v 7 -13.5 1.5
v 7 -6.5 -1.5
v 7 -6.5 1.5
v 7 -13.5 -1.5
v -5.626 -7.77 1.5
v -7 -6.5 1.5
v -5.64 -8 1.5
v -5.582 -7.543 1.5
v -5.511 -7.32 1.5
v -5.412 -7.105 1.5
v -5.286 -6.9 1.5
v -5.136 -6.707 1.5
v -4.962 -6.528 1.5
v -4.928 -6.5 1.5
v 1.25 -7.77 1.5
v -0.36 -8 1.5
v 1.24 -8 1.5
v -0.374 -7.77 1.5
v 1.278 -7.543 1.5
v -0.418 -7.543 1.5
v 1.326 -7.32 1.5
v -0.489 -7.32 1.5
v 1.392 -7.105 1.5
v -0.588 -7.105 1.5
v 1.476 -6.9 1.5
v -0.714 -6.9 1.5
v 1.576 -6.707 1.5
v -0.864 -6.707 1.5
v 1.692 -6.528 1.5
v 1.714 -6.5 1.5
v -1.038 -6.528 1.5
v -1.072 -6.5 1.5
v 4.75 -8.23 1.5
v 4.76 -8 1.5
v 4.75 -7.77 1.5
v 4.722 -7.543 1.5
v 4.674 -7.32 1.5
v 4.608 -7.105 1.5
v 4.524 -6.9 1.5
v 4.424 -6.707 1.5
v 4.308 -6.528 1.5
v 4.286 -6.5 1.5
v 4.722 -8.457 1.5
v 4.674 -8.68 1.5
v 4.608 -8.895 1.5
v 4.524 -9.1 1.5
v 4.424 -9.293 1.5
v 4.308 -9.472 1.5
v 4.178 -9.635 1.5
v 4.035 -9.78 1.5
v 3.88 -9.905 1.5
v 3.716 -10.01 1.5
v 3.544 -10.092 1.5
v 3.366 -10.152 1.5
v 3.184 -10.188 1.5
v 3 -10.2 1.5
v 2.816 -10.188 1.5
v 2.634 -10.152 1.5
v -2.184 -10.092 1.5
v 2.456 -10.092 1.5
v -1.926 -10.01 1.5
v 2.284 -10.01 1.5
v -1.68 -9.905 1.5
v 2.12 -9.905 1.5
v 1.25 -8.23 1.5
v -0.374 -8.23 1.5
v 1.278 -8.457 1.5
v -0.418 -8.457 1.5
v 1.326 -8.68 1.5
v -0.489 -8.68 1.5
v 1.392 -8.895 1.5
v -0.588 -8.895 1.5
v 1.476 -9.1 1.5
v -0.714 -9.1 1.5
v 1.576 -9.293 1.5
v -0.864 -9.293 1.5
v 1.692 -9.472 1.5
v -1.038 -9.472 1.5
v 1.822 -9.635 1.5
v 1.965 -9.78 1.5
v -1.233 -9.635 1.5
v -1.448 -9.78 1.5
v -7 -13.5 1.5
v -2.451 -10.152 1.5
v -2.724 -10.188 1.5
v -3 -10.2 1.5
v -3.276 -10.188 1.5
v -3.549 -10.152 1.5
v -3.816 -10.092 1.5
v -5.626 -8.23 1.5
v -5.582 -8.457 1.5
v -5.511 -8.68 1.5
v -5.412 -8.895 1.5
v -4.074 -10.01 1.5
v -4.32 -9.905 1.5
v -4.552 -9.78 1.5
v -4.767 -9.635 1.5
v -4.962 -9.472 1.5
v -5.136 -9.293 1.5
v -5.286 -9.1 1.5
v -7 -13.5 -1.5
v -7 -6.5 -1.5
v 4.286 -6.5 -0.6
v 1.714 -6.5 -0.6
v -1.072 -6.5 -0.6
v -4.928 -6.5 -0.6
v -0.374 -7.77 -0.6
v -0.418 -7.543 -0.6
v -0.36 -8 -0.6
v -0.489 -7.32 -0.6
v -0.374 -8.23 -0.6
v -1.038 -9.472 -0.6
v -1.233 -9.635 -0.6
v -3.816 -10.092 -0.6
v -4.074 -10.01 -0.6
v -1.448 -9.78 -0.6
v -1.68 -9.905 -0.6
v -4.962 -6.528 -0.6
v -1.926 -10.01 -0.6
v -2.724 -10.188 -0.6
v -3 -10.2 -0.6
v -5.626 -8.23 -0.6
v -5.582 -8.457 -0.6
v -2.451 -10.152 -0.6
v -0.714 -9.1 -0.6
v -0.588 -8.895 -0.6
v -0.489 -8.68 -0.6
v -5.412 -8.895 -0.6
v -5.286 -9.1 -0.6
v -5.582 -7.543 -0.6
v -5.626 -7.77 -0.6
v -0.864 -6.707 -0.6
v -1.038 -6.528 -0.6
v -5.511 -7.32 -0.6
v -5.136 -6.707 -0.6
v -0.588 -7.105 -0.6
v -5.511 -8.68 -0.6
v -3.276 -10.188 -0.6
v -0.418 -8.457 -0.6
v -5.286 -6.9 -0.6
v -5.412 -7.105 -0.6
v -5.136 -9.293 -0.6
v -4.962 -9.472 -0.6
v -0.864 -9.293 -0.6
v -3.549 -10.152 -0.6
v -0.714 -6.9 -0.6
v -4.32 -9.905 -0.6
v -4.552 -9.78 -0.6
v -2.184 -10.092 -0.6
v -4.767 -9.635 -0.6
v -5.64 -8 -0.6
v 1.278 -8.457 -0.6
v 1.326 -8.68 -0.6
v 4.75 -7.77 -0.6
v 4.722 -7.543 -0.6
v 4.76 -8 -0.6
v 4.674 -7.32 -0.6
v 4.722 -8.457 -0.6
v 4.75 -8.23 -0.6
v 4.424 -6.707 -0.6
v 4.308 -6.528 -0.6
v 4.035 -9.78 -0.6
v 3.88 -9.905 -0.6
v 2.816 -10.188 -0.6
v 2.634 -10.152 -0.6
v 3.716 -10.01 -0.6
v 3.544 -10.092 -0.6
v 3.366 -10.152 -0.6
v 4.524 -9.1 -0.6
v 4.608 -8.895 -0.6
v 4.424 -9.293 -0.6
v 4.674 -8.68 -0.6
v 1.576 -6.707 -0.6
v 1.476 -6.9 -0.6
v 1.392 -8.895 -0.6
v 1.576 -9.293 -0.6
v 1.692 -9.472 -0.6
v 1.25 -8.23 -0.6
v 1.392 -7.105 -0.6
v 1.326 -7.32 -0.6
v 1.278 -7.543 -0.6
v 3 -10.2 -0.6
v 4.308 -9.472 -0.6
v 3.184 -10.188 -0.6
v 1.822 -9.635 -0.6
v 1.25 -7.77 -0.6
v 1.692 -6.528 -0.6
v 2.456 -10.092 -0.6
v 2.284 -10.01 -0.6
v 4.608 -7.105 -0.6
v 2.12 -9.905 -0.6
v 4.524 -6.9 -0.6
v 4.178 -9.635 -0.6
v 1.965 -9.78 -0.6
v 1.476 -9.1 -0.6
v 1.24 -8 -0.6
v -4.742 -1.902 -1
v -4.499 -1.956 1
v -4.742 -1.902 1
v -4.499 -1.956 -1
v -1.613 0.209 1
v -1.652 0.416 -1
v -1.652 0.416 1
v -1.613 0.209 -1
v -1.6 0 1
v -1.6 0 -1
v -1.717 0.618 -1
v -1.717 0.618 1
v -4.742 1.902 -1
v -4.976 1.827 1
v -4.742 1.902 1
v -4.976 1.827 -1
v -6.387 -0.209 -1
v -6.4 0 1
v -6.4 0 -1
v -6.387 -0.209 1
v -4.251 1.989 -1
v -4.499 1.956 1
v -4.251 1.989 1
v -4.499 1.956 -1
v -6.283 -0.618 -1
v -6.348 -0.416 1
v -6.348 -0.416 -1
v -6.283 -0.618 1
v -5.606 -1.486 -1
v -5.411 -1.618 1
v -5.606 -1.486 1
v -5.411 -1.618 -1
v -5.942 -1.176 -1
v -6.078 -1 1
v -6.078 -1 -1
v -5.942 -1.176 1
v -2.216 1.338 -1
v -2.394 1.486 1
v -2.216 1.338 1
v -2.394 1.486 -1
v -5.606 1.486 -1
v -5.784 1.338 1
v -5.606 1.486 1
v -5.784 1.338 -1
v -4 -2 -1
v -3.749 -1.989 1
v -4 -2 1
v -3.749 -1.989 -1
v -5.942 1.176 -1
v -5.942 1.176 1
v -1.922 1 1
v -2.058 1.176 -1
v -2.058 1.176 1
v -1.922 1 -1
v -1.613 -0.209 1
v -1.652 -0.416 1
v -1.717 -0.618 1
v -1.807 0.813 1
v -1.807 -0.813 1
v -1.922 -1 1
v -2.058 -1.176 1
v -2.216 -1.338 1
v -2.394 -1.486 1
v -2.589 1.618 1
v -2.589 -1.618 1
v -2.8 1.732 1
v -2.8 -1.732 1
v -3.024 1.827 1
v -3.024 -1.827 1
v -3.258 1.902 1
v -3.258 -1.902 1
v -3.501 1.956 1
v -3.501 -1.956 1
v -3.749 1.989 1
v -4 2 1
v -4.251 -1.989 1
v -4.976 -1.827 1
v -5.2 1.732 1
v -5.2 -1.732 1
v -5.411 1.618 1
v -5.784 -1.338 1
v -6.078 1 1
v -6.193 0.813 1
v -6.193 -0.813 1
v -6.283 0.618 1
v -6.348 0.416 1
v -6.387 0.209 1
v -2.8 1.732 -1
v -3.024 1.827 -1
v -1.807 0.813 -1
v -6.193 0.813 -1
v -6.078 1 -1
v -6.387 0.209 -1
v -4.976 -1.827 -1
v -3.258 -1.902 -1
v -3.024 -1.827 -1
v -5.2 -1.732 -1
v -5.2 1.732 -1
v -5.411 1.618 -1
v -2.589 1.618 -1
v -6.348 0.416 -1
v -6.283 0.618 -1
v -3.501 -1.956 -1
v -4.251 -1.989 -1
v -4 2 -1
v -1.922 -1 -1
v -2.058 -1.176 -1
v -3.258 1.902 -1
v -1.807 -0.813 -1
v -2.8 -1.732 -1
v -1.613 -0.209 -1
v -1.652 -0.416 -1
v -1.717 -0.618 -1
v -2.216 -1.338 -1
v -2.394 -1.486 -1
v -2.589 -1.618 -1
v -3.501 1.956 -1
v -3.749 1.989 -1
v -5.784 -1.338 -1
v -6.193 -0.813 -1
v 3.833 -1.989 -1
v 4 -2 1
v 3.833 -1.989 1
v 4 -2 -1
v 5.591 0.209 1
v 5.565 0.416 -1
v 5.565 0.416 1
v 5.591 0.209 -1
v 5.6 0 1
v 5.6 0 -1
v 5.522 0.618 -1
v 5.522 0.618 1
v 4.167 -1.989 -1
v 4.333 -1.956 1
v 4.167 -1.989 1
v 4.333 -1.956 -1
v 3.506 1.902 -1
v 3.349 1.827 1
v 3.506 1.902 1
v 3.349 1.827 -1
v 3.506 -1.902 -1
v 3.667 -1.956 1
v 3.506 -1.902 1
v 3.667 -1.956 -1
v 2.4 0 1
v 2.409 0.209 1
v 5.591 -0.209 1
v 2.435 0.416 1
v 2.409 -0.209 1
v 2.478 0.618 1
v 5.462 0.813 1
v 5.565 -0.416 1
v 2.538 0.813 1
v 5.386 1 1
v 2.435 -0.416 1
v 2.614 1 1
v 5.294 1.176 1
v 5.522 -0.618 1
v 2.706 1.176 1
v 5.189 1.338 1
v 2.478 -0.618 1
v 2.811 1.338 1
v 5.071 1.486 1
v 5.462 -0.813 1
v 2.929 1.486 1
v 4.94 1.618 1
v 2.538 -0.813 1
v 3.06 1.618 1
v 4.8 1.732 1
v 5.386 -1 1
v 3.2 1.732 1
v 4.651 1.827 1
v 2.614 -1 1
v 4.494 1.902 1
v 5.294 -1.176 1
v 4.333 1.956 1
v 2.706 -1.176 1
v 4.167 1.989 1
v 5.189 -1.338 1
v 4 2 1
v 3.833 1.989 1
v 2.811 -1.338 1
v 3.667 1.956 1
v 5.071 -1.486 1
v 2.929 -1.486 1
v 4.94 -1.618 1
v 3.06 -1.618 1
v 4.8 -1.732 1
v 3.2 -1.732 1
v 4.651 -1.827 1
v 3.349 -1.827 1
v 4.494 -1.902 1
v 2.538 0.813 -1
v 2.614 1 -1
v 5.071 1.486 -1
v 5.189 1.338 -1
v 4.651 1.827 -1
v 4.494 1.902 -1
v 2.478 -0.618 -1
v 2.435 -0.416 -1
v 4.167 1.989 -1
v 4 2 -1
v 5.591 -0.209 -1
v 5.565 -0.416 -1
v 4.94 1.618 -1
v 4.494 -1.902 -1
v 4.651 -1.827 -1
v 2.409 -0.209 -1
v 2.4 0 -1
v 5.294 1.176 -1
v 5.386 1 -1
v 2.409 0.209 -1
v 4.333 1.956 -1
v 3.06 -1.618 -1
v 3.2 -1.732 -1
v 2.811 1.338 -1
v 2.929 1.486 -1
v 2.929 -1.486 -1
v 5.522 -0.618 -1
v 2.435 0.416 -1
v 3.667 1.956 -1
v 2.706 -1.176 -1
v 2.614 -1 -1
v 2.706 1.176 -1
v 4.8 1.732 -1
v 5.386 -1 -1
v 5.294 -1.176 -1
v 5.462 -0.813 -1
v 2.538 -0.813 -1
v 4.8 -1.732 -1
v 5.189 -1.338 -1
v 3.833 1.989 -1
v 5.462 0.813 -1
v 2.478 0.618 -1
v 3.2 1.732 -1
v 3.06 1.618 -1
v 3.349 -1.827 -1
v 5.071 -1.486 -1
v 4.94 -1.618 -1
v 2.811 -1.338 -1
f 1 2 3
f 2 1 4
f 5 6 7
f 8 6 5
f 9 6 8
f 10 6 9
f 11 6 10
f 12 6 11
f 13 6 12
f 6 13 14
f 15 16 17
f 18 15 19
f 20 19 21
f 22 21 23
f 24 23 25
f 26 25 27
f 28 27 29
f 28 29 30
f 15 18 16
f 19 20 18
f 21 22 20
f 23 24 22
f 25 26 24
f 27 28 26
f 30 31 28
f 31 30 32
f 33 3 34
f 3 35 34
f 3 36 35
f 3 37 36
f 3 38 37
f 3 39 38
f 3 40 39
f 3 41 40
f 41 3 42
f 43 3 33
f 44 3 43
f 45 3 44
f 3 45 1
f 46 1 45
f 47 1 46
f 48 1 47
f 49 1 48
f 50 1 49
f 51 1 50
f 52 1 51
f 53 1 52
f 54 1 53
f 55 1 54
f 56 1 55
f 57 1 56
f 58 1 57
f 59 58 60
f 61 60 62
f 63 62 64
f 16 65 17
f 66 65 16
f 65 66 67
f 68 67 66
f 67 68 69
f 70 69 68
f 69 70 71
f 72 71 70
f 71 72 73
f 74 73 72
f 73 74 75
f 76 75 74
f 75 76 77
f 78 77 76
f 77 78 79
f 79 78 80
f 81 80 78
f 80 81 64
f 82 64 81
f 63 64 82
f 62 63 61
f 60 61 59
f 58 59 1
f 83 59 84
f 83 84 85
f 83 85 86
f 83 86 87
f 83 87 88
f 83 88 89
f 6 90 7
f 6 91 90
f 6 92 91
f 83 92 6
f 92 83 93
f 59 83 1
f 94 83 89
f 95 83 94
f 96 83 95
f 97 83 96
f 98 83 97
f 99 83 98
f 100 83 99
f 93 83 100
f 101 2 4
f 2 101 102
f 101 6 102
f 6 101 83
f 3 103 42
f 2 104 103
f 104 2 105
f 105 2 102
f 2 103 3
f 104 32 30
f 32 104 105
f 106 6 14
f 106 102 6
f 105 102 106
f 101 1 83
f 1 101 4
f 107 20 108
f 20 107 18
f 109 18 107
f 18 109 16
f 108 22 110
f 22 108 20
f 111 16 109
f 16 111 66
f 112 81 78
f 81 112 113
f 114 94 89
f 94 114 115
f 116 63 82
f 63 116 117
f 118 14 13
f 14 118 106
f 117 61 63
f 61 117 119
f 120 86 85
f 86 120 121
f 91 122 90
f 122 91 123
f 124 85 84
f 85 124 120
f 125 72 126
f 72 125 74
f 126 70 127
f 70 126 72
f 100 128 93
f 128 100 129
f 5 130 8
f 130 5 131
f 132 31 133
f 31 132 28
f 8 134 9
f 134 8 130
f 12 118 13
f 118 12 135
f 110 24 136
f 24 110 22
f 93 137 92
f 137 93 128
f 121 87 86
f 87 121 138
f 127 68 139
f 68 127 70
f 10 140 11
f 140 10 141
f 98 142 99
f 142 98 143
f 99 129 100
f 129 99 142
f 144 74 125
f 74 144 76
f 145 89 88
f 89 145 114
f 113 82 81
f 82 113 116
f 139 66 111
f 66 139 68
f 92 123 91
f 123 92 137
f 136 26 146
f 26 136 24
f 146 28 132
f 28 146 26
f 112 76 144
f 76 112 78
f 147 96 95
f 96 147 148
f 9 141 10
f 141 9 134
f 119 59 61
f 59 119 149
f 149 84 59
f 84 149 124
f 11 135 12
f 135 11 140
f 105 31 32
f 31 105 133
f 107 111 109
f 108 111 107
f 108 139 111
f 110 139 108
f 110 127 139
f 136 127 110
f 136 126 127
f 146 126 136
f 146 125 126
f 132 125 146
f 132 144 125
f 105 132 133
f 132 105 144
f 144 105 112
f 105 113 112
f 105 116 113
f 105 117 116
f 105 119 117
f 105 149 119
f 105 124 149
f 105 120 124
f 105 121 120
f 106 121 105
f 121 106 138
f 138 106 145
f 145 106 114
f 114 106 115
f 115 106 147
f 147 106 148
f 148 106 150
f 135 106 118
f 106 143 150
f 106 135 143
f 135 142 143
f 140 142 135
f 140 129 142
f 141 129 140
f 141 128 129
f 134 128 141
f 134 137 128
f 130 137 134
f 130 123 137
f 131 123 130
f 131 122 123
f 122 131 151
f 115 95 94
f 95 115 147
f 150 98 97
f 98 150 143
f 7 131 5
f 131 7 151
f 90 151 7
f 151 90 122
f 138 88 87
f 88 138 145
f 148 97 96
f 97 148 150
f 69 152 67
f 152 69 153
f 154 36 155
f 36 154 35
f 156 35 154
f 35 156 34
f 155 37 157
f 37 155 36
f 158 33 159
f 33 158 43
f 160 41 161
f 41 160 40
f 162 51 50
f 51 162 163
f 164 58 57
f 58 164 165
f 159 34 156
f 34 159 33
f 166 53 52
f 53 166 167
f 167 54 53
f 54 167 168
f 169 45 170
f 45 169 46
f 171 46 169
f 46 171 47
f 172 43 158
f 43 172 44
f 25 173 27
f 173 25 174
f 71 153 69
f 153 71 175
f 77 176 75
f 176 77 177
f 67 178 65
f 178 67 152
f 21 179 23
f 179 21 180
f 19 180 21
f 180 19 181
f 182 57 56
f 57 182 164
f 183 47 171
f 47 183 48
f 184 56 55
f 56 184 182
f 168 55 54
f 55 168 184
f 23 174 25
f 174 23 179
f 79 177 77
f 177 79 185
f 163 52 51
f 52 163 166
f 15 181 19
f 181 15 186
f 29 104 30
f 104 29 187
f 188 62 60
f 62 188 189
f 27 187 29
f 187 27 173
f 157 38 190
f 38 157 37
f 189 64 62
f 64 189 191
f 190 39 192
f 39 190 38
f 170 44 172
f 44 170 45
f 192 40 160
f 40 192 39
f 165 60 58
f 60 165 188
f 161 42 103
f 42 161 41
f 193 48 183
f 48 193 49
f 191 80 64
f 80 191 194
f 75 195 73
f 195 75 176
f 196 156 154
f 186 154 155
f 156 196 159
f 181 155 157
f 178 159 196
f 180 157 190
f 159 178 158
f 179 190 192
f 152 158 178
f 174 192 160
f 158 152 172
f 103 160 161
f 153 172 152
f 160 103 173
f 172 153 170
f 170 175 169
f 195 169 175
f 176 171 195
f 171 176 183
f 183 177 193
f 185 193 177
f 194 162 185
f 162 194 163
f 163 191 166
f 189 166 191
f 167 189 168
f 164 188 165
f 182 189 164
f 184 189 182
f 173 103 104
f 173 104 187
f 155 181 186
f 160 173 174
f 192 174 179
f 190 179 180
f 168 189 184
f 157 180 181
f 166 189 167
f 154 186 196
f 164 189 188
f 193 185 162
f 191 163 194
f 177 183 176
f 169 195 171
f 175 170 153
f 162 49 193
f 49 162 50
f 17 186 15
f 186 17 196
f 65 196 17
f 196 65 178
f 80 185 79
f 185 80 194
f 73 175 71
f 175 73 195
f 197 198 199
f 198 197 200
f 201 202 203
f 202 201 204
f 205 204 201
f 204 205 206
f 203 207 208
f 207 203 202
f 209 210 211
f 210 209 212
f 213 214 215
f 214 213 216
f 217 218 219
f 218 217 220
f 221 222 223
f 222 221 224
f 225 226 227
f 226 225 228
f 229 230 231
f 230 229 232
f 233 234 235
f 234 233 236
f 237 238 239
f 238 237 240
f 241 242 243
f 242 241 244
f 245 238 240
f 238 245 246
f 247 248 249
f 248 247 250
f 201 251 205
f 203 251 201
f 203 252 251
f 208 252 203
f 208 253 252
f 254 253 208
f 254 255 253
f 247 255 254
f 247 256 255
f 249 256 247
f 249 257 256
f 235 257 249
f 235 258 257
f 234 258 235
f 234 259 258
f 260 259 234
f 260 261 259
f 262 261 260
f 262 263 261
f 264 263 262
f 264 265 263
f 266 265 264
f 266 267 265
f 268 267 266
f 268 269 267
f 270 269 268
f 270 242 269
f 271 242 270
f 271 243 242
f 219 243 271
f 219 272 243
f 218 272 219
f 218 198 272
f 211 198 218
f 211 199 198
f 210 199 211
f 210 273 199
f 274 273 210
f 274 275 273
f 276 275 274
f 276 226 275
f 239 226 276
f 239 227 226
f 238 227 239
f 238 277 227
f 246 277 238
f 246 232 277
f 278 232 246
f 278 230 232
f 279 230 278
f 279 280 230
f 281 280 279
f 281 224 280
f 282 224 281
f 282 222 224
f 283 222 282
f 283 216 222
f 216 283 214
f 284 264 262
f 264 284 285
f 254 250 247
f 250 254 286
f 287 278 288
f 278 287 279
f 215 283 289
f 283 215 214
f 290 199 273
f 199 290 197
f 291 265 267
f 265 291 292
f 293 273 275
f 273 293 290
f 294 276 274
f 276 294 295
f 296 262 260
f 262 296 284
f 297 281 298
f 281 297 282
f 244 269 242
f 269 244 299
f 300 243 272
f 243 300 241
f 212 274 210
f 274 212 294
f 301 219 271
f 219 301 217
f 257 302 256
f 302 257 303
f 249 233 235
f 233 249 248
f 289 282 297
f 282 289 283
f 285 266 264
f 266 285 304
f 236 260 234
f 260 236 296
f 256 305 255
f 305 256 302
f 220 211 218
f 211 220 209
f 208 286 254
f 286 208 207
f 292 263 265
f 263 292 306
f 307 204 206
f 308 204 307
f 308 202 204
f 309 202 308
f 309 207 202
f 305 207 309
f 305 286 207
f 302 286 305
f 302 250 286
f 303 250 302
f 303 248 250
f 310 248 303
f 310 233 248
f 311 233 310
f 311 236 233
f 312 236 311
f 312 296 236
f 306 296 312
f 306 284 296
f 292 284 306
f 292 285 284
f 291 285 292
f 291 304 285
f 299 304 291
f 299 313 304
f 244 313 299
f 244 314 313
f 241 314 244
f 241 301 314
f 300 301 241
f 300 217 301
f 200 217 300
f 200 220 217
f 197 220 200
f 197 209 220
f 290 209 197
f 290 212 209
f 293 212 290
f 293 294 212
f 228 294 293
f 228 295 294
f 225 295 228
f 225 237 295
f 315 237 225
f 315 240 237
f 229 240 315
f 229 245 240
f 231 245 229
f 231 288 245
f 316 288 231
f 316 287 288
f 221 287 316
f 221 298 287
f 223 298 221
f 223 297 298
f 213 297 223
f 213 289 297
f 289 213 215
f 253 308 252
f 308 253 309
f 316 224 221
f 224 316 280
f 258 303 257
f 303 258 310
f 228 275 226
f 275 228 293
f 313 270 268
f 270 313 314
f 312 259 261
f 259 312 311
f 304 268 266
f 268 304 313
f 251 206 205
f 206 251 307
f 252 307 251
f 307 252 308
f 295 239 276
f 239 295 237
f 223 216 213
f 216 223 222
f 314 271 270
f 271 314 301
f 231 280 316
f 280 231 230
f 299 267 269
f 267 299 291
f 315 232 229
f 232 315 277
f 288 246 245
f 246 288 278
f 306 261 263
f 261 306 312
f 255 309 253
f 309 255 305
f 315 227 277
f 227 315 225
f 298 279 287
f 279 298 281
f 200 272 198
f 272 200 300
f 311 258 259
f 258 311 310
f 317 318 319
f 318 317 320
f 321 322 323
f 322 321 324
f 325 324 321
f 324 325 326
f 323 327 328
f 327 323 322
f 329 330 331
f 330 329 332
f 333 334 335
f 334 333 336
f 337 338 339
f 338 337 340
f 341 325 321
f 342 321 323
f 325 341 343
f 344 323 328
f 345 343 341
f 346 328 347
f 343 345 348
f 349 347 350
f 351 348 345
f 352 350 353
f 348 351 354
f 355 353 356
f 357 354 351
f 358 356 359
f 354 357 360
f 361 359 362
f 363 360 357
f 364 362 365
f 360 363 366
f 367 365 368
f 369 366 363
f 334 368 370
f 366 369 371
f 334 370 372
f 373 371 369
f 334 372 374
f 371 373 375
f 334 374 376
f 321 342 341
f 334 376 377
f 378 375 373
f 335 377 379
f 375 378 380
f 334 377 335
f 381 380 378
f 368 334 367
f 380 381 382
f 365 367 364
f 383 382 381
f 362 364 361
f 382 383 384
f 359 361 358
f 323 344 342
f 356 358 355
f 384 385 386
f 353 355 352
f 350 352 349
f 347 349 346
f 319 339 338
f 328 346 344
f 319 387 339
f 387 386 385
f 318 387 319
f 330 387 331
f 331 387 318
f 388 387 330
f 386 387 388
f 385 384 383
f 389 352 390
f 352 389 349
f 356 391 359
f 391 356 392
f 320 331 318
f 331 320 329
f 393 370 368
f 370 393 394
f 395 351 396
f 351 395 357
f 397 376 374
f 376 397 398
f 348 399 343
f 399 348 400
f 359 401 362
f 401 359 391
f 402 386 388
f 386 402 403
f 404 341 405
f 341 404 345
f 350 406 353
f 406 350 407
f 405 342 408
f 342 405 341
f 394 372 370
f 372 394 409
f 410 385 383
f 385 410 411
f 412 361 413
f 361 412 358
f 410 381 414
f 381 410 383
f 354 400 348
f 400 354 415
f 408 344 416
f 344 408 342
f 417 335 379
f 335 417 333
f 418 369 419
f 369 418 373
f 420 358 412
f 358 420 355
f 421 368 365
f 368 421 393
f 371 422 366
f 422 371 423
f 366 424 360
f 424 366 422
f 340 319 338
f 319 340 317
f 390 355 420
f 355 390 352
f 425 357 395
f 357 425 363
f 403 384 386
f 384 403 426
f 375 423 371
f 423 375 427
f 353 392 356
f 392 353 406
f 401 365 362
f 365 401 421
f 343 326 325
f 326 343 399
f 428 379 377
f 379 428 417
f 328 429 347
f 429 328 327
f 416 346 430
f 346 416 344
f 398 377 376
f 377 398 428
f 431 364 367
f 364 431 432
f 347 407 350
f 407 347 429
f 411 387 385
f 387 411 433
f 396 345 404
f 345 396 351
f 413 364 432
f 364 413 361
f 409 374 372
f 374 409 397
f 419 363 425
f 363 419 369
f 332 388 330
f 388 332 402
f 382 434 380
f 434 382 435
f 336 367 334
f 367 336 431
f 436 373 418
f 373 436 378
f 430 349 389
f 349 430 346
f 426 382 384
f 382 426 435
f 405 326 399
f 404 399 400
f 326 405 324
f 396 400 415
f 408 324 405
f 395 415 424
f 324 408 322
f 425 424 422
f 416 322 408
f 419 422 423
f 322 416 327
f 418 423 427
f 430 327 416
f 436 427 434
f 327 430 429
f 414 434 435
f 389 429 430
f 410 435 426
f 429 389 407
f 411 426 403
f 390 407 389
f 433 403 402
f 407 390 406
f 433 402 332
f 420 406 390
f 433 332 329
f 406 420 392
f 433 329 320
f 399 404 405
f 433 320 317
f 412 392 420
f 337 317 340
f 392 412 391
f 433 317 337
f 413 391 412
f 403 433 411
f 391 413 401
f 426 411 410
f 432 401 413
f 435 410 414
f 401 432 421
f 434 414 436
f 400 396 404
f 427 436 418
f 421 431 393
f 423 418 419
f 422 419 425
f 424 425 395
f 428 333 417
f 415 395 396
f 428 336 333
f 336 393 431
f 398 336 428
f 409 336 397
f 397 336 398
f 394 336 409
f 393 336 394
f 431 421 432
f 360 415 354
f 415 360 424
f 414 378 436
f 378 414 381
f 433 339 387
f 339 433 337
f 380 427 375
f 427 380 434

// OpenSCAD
// enzyme_synthesis.scad
// 合成作用酵素與受質

// 受質1（左側橢圓小分子）
module substrate1_synthesis() {
    color("saddlebrown")
    translate([-4, 0, 0]) scale([1.2,1,1]) cylinder(h=2, r=2, center=true, $fn=60);
}

// 受質2（右側橢圓小分子）
module substrate2_synthesis() {
    color("peru")
    translate([4, 0, 0]) scale([0.8,1,1]) cylinder(h=2, r=2, center=true, $fn=60);
}

// 酵素（下方深色雙凹槽）
module enzyme_synthesis() {
    difference() {
        // 主體
        color("saddlebrown") cube([14, 7, 3], center=true);
        // 左凹槽
        translate([-3, 2, 1]) scale([1.2,1,1]) cylinder(h=3.2, r=2.2, center=true, $fn=60);
        // 右凹槽
        translate([3, 2, 1]) scale([0.8,1,1]) cylinder(h=3.2, r=2.2, center=true, $fn=60);
    }
}

// 渲染
substrate1_synthesis();
substrate2_synthesis();
translate([0, -10, 0]) enzyme_synthesis();
